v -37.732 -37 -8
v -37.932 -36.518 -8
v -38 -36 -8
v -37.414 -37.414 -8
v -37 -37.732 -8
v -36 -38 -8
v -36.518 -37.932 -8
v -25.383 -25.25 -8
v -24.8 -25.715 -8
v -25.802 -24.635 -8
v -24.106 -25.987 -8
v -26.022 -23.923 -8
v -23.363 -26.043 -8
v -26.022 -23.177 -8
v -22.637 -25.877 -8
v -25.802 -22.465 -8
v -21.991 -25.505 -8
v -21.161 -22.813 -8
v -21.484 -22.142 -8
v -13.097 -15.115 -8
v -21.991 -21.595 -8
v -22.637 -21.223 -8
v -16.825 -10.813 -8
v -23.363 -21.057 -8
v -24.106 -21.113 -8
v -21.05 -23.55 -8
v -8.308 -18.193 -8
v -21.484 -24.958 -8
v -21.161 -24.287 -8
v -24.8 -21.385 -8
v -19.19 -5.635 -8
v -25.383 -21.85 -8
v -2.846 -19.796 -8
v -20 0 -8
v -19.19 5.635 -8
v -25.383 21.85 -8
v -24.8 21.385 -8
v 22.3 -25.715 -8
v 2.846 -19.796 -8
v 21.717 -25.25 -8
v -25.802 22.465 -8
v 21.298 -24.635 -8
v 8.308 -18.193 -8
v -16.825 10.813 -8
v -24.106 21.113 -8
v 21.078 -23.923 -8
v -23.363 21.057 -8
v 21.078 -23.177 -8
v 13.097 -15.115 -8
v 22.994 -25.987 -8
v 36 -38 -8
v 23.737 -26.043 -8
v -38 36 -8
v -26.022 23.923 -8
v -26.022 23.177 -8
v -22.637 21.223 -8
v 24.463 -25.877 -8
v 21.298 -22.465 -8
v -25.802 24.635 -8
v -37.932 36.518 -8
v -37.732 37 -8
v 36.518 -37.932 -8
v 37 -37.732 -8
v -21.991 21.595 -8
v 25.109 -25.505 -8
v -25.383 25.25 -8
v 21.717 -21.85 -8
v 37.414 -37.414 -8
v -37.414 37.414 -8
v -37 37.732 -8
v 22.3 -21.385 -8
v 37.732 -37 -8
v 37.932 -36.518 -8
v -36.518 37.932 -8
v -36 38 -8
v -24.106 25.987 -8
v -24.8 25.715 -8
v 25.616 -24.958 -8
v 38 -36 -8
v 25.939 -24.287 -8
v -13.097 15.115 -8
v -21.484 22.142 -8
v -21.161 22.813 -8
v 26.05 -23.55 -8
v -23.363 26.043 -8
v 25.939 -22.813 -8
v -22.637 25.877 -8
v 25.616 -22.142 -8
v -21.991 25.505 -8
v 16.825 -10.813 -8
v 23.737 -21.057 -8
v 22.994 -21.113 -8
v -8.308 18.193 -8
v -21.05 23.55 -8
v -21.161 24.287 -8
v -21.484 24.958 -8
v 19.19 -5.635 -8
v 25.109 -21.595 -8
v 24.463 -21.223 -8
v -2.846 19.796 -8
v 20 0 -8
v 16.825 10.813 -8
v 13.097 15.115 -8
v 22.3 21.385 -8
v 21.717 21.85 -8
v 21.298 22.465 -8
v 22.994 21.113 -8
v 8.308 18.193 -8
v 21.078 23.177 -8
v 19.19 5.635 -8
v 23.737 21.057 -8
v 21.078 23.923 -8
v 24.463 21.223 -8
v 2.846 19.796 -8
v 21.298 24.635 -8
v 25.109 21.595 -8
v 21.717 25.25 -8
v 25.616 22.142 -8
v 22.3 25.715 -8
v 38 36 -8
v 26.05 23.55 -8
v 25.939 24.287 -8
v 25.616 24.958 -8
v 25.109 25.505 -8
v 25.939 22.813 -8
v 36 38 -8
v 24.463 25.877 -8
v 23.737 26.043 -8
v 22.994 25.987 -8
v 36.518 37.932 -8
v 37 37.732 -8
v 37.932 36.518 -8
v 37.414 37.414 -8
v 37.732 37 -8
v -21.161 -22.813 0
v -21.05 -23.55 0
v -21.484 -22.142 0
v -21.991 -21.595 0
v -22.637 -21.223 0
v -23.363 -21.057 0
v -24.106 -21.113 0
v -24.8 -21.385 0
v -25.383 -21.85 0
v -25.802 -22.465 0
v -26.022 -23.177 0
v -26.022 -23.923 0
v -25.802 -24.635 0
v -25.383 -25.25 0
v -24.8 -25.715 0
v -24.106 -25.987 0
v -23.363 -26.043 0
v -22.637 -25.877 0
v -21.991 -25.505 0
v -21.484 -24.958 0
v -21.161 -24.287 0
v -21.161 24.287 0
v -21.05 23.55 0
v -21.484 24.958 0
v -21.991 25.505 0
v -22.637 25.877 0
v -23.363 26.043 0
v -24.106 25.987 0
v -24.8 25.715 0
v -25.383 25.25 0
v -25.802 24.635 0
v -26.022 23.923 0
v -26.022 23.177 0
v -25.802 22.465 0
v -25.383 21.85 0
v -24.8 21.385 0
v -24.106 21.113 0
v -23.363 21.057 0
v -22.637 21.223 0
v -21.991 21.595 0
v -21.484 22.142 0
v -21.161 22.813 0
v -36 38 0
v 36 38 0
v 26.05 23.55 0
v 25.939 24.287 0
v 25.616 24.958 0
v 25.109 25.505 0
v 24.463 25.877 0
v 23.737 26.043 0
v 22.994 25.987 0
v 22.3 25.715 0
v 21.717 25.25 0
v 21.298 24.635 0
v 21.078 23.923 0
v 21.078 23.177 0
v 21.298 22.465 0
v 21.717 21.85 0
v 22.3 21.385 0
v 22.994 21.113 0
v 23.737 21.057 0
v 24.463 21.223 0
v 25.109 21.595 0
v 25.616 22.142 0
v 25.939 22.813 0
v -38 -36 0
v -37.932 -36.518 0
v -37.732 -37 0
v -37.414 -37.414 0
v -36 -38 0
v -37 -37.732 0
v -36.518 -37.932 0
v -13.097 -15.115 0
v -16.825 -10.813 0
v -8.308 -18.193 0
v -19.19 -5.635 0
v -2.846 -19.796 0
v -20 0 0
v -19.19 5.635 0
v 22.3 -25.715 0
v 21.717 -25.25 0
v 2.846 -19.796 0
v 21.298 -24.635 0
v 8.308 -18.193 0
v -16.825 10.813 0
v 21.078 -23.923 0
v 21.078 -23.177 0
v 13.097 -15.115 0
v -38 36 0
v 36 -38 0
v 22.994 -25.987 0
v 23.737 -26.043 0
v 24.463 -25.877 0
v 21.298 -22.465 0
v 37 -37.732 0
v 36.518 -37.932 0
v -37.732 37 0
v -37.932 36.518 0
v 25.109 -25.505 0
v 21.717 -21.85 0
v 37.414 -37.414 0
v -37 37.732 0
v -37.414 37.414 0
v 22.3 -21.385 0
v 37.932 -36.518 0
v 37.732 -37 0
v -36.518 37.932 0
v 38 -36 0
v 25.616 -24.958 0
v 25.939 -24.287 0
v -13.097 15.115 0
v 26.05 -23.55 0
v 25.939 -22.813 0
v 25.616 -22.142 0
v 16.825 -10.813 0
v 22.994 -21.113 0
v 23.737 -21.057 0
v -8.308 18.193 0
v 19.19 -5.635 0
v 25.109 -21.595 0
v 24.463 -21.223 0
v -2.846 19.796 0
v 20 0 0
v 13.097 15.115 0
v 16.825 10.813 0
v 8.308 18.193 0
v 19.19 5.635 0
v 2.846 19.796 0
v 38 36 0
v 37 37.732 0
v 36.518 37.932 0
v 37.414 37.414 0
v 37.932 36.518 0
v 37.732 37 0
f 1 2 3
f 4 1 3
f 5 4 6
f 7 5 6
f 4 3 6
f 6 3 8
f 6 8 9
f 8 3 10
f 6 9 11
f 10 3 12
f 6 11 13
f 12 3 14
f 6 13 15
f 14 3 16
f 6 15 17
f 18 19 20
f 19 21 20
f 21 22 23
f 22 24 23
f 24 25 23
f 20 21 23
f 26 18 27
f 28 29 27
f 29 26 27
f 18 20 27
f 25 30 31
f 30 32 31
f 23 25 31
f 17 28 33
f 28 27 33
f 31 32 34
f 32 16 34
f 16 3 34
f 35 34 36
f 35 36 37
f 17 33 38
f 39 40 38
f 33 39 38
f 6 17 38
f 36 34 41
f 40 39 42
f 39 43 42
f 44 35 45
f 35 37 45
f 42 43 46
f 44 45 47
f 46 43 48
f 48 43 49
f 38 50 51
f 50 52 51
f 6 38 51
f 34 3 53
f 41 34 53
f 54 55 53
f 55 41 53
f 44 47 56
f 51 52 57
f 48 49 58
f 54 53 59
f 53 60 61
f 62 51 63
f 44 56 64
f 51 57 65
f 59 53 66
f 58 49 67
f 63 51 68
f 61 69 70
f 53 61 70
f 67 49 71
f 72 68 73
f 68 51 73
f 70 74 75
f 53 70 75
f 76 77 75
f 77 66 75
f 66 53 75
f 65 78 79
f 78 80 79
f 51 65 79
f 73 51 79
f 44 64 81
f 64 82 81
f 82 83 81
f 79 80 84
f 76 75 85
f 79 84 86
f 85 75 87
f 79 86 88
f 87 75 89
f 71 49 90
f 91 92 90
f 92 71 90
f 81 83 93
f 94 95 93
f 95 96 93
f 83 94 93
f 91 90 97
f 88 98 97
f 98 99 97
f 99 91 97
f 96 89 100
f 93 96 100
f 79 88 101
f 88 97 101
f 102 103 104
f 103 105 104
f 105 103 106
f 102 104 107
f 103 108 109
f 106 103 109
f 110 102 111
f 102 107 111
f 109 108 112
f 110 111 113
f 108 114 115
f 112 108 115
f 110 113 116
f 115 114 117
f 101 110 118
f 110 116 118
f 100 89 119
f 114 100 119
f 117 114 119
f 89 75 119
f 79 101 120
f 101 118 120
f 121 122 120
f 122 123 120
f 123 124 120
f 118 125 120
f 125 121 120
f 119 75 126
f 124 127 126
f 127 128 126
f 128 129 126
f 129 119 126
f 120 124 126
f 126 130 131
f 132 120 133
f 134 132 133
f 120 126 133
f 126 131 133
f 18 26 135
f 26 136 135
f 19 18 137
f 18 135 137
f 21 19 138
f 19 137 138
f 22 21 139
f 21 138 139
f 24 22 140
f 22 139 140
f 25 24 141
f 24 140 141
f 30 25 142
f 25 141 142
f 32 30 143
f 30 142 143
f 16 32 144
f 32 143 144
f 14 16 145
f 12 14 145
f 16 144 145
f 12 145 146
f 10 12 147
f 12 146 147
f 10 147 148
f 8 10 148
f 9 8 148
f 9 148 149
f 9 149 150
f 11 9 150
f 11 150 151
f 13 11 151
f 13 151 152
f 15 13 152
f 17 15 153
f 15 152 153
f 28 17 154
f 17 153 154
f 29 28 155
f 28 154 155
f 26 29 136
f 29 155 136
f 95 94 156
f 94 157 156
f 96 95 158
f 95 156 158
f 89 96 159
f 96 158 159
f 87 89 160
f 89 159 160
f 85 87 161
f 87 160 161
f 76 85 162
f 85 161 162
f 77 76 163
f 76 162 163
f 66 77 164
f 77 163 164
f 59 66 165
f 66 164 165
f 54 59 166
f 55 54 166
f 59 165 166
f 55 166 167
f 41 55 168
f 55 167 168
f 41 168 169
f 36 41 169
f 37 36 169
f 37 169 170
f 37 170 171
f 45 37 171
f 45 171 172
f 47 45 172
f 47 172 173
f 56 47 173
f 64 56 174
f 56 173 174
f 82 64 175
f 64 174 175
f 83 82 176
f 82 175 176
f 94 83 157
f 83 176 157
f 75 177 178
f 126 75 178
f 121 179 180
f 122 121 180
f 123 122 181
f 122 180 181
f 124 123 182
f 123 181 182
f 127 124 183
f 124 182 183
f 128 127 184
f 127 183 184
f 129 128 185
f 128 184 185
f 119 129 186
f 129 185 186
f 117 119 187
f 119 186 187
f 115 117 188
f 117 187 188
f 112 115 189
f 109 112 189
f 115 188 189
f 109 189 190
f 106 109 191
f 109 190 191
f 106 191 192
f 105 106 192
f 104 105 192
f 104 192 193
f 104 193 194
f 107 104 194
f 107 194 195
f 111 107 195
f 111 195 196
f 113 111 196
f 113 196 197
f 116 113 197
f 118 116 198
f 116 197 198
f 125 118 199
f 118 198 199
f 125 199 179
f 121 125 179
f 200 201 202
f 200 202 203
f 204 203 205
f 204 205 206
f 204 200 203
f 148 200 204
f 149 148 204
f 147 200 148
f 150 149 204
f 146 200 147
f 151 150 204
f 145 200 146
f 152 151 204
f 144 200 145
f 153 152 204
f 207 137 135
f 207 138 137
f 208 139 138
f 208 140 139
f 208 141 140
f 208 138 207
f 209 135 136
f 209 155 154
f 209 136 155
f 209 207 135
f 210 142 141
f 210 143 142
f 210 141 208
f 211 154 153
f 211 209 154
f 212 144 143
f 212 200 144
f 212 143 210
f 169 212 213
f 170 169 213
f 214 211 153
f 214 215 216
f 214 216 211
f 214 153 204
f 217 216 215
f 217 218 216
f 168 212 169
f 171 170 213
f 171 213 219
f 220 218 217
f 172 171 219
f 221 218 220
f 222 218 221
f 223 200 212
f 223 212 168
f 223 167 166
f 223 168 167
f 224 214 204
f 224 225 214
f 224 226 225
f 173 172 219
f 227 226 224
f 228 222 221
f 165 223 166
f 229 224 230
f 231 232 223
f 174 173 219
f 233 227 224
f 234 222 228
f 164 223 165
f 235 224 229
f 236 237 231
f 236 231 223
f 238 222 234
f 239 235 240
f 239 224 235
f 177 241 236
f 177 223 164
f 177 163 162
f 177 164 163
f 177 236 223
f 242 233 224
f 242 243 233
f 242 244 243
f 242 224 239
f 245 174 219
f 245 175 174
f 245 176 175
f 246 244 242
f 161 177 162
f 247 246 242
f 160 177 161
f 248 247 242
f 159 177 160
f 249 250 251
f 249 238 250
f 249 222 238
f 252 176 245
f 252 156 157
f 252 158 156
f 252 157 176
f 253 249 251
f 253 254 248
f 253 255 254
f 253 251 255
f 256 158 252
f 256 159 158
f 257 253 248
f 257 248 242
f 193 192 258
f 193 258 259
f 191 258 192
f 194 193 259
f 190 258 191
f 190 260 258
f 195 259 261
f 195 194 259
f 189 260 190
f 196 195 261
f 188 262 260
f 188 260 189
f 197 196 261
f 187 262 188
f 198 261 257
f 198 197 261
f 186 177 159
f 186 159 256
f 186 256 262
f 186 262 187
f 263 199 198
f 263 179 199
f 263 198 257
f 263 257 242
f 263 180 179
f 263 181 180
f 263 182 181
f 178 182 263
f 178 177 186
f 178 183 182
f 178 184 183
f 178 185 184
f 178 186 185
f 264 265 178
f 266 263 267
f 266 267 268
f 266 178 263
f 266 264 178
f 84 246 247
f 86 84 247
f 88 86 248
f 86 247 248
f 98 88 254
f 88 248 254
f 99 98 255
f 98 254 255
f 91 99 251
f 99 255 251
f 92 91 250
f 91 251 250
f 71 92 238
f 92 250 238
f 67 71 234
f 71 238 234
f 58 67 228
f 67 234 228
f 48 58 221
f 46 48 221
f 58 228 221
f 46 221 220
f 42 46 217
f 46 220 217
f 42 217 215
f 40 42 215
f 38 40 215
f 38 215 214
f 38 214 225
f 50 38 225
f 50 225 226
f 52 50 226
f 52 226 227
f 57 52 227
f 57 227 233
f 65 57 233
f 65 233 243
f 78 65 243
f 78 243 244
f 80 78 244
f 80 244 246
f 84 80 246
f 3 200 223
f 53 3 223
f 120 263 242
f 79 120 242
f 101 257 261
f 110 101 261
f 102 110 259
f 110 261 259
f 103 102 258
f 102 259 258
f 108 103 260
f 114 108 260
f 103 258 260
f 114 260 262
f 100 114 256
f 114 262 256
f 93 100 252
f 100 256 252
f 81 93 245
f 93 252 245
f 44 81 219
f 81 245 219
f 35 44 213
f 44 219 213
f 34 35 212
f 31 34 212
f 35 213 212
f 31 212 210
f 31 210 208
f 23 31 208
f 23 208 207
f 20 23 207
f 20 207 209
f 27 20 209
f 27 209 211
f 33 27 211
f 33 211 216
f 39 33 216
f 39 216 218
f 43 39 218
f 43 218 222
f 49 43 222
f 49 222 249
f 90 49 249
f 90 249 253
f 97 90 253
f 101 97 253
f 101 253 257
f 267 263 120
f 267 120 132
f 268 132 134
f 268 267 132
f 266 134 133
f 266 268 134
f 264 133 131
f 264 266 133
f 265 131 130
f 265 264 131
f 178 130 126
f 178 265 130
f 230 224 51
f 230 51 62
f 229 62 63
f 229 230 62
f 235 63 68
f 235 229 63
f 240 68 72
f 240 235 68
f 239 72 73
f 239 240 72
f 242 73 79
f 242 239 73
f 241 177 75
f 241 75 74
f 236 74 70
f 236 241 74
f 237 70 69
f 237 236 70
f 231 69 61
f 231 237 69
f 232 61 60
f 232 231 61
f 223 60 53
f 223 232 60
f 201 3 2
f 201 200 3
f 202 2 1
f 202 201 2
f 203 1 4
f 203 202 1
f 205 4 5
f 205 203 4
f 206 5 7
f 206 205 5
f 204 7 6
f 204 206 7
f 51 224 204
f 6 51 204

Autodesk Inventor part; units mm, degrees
ref_plane "YZ Plane" through (0, 0, 0) normal (1, 0, 0) x (0, 1, 0)
ref_plane "XZ Plane" through (0, 0, 0) normal (0, 1, 0) x (-1, 0, 0)
ref_plane "XY Plane" through (0, 0, 0) normal (0, 0, 1) x (1, 0, 0)
sketch "Boceto1" plane through (0, 0, 0) normal (0, 0, 1) x (1, 0, 0)
  line L0 (-36, 38) -> (36, 38)
  line L1 (38, 36) -> (38, -36)
  line L2 (36, -38) -> (-36, -38)
  line L3 (-38, -36) -> (-38, 36)
  arc A0 (-36, 38) -> (-38, 36) centre (-36, 36) ccw
  arc A1 (38, 36) -> (36, 38) centre (36, 36) ccw
  arc A2 (36, -38) -> (38, -36) centre (36, -36) ccw
  arc A3 (-38, -36) -> (-36, -38) centre (-36, -36) ccw
  line L4 (-36, 36) -> (36, -36) construction
  line L5 (-36, -36) -> (36, 36) construction
  circle A4 centre (23.55, 23.55) radius 2.5
  circle A5 centre (23.55, -23.55) radius 2.5
  circle A6 centre (-23.55, -23.55) radius 2.5
  circle A7 centre (-23.55, 23.55) radius 2.5
  circle A8 centre (0, 0) radius 20
  point P0 (-38, 38)
  point P1 (-38, -38)
  dimension "d0" = 76
  dimension "d1" = 2
  dimension "d2" = 5
  dimension "d3" = 61.6095
  dimension "d4" = 40
  dimension "d23" = 47.1
extrude "Extrusión1" add sketch "Boceto1" against normal blind 8
properties part number "placa soporte motor"
